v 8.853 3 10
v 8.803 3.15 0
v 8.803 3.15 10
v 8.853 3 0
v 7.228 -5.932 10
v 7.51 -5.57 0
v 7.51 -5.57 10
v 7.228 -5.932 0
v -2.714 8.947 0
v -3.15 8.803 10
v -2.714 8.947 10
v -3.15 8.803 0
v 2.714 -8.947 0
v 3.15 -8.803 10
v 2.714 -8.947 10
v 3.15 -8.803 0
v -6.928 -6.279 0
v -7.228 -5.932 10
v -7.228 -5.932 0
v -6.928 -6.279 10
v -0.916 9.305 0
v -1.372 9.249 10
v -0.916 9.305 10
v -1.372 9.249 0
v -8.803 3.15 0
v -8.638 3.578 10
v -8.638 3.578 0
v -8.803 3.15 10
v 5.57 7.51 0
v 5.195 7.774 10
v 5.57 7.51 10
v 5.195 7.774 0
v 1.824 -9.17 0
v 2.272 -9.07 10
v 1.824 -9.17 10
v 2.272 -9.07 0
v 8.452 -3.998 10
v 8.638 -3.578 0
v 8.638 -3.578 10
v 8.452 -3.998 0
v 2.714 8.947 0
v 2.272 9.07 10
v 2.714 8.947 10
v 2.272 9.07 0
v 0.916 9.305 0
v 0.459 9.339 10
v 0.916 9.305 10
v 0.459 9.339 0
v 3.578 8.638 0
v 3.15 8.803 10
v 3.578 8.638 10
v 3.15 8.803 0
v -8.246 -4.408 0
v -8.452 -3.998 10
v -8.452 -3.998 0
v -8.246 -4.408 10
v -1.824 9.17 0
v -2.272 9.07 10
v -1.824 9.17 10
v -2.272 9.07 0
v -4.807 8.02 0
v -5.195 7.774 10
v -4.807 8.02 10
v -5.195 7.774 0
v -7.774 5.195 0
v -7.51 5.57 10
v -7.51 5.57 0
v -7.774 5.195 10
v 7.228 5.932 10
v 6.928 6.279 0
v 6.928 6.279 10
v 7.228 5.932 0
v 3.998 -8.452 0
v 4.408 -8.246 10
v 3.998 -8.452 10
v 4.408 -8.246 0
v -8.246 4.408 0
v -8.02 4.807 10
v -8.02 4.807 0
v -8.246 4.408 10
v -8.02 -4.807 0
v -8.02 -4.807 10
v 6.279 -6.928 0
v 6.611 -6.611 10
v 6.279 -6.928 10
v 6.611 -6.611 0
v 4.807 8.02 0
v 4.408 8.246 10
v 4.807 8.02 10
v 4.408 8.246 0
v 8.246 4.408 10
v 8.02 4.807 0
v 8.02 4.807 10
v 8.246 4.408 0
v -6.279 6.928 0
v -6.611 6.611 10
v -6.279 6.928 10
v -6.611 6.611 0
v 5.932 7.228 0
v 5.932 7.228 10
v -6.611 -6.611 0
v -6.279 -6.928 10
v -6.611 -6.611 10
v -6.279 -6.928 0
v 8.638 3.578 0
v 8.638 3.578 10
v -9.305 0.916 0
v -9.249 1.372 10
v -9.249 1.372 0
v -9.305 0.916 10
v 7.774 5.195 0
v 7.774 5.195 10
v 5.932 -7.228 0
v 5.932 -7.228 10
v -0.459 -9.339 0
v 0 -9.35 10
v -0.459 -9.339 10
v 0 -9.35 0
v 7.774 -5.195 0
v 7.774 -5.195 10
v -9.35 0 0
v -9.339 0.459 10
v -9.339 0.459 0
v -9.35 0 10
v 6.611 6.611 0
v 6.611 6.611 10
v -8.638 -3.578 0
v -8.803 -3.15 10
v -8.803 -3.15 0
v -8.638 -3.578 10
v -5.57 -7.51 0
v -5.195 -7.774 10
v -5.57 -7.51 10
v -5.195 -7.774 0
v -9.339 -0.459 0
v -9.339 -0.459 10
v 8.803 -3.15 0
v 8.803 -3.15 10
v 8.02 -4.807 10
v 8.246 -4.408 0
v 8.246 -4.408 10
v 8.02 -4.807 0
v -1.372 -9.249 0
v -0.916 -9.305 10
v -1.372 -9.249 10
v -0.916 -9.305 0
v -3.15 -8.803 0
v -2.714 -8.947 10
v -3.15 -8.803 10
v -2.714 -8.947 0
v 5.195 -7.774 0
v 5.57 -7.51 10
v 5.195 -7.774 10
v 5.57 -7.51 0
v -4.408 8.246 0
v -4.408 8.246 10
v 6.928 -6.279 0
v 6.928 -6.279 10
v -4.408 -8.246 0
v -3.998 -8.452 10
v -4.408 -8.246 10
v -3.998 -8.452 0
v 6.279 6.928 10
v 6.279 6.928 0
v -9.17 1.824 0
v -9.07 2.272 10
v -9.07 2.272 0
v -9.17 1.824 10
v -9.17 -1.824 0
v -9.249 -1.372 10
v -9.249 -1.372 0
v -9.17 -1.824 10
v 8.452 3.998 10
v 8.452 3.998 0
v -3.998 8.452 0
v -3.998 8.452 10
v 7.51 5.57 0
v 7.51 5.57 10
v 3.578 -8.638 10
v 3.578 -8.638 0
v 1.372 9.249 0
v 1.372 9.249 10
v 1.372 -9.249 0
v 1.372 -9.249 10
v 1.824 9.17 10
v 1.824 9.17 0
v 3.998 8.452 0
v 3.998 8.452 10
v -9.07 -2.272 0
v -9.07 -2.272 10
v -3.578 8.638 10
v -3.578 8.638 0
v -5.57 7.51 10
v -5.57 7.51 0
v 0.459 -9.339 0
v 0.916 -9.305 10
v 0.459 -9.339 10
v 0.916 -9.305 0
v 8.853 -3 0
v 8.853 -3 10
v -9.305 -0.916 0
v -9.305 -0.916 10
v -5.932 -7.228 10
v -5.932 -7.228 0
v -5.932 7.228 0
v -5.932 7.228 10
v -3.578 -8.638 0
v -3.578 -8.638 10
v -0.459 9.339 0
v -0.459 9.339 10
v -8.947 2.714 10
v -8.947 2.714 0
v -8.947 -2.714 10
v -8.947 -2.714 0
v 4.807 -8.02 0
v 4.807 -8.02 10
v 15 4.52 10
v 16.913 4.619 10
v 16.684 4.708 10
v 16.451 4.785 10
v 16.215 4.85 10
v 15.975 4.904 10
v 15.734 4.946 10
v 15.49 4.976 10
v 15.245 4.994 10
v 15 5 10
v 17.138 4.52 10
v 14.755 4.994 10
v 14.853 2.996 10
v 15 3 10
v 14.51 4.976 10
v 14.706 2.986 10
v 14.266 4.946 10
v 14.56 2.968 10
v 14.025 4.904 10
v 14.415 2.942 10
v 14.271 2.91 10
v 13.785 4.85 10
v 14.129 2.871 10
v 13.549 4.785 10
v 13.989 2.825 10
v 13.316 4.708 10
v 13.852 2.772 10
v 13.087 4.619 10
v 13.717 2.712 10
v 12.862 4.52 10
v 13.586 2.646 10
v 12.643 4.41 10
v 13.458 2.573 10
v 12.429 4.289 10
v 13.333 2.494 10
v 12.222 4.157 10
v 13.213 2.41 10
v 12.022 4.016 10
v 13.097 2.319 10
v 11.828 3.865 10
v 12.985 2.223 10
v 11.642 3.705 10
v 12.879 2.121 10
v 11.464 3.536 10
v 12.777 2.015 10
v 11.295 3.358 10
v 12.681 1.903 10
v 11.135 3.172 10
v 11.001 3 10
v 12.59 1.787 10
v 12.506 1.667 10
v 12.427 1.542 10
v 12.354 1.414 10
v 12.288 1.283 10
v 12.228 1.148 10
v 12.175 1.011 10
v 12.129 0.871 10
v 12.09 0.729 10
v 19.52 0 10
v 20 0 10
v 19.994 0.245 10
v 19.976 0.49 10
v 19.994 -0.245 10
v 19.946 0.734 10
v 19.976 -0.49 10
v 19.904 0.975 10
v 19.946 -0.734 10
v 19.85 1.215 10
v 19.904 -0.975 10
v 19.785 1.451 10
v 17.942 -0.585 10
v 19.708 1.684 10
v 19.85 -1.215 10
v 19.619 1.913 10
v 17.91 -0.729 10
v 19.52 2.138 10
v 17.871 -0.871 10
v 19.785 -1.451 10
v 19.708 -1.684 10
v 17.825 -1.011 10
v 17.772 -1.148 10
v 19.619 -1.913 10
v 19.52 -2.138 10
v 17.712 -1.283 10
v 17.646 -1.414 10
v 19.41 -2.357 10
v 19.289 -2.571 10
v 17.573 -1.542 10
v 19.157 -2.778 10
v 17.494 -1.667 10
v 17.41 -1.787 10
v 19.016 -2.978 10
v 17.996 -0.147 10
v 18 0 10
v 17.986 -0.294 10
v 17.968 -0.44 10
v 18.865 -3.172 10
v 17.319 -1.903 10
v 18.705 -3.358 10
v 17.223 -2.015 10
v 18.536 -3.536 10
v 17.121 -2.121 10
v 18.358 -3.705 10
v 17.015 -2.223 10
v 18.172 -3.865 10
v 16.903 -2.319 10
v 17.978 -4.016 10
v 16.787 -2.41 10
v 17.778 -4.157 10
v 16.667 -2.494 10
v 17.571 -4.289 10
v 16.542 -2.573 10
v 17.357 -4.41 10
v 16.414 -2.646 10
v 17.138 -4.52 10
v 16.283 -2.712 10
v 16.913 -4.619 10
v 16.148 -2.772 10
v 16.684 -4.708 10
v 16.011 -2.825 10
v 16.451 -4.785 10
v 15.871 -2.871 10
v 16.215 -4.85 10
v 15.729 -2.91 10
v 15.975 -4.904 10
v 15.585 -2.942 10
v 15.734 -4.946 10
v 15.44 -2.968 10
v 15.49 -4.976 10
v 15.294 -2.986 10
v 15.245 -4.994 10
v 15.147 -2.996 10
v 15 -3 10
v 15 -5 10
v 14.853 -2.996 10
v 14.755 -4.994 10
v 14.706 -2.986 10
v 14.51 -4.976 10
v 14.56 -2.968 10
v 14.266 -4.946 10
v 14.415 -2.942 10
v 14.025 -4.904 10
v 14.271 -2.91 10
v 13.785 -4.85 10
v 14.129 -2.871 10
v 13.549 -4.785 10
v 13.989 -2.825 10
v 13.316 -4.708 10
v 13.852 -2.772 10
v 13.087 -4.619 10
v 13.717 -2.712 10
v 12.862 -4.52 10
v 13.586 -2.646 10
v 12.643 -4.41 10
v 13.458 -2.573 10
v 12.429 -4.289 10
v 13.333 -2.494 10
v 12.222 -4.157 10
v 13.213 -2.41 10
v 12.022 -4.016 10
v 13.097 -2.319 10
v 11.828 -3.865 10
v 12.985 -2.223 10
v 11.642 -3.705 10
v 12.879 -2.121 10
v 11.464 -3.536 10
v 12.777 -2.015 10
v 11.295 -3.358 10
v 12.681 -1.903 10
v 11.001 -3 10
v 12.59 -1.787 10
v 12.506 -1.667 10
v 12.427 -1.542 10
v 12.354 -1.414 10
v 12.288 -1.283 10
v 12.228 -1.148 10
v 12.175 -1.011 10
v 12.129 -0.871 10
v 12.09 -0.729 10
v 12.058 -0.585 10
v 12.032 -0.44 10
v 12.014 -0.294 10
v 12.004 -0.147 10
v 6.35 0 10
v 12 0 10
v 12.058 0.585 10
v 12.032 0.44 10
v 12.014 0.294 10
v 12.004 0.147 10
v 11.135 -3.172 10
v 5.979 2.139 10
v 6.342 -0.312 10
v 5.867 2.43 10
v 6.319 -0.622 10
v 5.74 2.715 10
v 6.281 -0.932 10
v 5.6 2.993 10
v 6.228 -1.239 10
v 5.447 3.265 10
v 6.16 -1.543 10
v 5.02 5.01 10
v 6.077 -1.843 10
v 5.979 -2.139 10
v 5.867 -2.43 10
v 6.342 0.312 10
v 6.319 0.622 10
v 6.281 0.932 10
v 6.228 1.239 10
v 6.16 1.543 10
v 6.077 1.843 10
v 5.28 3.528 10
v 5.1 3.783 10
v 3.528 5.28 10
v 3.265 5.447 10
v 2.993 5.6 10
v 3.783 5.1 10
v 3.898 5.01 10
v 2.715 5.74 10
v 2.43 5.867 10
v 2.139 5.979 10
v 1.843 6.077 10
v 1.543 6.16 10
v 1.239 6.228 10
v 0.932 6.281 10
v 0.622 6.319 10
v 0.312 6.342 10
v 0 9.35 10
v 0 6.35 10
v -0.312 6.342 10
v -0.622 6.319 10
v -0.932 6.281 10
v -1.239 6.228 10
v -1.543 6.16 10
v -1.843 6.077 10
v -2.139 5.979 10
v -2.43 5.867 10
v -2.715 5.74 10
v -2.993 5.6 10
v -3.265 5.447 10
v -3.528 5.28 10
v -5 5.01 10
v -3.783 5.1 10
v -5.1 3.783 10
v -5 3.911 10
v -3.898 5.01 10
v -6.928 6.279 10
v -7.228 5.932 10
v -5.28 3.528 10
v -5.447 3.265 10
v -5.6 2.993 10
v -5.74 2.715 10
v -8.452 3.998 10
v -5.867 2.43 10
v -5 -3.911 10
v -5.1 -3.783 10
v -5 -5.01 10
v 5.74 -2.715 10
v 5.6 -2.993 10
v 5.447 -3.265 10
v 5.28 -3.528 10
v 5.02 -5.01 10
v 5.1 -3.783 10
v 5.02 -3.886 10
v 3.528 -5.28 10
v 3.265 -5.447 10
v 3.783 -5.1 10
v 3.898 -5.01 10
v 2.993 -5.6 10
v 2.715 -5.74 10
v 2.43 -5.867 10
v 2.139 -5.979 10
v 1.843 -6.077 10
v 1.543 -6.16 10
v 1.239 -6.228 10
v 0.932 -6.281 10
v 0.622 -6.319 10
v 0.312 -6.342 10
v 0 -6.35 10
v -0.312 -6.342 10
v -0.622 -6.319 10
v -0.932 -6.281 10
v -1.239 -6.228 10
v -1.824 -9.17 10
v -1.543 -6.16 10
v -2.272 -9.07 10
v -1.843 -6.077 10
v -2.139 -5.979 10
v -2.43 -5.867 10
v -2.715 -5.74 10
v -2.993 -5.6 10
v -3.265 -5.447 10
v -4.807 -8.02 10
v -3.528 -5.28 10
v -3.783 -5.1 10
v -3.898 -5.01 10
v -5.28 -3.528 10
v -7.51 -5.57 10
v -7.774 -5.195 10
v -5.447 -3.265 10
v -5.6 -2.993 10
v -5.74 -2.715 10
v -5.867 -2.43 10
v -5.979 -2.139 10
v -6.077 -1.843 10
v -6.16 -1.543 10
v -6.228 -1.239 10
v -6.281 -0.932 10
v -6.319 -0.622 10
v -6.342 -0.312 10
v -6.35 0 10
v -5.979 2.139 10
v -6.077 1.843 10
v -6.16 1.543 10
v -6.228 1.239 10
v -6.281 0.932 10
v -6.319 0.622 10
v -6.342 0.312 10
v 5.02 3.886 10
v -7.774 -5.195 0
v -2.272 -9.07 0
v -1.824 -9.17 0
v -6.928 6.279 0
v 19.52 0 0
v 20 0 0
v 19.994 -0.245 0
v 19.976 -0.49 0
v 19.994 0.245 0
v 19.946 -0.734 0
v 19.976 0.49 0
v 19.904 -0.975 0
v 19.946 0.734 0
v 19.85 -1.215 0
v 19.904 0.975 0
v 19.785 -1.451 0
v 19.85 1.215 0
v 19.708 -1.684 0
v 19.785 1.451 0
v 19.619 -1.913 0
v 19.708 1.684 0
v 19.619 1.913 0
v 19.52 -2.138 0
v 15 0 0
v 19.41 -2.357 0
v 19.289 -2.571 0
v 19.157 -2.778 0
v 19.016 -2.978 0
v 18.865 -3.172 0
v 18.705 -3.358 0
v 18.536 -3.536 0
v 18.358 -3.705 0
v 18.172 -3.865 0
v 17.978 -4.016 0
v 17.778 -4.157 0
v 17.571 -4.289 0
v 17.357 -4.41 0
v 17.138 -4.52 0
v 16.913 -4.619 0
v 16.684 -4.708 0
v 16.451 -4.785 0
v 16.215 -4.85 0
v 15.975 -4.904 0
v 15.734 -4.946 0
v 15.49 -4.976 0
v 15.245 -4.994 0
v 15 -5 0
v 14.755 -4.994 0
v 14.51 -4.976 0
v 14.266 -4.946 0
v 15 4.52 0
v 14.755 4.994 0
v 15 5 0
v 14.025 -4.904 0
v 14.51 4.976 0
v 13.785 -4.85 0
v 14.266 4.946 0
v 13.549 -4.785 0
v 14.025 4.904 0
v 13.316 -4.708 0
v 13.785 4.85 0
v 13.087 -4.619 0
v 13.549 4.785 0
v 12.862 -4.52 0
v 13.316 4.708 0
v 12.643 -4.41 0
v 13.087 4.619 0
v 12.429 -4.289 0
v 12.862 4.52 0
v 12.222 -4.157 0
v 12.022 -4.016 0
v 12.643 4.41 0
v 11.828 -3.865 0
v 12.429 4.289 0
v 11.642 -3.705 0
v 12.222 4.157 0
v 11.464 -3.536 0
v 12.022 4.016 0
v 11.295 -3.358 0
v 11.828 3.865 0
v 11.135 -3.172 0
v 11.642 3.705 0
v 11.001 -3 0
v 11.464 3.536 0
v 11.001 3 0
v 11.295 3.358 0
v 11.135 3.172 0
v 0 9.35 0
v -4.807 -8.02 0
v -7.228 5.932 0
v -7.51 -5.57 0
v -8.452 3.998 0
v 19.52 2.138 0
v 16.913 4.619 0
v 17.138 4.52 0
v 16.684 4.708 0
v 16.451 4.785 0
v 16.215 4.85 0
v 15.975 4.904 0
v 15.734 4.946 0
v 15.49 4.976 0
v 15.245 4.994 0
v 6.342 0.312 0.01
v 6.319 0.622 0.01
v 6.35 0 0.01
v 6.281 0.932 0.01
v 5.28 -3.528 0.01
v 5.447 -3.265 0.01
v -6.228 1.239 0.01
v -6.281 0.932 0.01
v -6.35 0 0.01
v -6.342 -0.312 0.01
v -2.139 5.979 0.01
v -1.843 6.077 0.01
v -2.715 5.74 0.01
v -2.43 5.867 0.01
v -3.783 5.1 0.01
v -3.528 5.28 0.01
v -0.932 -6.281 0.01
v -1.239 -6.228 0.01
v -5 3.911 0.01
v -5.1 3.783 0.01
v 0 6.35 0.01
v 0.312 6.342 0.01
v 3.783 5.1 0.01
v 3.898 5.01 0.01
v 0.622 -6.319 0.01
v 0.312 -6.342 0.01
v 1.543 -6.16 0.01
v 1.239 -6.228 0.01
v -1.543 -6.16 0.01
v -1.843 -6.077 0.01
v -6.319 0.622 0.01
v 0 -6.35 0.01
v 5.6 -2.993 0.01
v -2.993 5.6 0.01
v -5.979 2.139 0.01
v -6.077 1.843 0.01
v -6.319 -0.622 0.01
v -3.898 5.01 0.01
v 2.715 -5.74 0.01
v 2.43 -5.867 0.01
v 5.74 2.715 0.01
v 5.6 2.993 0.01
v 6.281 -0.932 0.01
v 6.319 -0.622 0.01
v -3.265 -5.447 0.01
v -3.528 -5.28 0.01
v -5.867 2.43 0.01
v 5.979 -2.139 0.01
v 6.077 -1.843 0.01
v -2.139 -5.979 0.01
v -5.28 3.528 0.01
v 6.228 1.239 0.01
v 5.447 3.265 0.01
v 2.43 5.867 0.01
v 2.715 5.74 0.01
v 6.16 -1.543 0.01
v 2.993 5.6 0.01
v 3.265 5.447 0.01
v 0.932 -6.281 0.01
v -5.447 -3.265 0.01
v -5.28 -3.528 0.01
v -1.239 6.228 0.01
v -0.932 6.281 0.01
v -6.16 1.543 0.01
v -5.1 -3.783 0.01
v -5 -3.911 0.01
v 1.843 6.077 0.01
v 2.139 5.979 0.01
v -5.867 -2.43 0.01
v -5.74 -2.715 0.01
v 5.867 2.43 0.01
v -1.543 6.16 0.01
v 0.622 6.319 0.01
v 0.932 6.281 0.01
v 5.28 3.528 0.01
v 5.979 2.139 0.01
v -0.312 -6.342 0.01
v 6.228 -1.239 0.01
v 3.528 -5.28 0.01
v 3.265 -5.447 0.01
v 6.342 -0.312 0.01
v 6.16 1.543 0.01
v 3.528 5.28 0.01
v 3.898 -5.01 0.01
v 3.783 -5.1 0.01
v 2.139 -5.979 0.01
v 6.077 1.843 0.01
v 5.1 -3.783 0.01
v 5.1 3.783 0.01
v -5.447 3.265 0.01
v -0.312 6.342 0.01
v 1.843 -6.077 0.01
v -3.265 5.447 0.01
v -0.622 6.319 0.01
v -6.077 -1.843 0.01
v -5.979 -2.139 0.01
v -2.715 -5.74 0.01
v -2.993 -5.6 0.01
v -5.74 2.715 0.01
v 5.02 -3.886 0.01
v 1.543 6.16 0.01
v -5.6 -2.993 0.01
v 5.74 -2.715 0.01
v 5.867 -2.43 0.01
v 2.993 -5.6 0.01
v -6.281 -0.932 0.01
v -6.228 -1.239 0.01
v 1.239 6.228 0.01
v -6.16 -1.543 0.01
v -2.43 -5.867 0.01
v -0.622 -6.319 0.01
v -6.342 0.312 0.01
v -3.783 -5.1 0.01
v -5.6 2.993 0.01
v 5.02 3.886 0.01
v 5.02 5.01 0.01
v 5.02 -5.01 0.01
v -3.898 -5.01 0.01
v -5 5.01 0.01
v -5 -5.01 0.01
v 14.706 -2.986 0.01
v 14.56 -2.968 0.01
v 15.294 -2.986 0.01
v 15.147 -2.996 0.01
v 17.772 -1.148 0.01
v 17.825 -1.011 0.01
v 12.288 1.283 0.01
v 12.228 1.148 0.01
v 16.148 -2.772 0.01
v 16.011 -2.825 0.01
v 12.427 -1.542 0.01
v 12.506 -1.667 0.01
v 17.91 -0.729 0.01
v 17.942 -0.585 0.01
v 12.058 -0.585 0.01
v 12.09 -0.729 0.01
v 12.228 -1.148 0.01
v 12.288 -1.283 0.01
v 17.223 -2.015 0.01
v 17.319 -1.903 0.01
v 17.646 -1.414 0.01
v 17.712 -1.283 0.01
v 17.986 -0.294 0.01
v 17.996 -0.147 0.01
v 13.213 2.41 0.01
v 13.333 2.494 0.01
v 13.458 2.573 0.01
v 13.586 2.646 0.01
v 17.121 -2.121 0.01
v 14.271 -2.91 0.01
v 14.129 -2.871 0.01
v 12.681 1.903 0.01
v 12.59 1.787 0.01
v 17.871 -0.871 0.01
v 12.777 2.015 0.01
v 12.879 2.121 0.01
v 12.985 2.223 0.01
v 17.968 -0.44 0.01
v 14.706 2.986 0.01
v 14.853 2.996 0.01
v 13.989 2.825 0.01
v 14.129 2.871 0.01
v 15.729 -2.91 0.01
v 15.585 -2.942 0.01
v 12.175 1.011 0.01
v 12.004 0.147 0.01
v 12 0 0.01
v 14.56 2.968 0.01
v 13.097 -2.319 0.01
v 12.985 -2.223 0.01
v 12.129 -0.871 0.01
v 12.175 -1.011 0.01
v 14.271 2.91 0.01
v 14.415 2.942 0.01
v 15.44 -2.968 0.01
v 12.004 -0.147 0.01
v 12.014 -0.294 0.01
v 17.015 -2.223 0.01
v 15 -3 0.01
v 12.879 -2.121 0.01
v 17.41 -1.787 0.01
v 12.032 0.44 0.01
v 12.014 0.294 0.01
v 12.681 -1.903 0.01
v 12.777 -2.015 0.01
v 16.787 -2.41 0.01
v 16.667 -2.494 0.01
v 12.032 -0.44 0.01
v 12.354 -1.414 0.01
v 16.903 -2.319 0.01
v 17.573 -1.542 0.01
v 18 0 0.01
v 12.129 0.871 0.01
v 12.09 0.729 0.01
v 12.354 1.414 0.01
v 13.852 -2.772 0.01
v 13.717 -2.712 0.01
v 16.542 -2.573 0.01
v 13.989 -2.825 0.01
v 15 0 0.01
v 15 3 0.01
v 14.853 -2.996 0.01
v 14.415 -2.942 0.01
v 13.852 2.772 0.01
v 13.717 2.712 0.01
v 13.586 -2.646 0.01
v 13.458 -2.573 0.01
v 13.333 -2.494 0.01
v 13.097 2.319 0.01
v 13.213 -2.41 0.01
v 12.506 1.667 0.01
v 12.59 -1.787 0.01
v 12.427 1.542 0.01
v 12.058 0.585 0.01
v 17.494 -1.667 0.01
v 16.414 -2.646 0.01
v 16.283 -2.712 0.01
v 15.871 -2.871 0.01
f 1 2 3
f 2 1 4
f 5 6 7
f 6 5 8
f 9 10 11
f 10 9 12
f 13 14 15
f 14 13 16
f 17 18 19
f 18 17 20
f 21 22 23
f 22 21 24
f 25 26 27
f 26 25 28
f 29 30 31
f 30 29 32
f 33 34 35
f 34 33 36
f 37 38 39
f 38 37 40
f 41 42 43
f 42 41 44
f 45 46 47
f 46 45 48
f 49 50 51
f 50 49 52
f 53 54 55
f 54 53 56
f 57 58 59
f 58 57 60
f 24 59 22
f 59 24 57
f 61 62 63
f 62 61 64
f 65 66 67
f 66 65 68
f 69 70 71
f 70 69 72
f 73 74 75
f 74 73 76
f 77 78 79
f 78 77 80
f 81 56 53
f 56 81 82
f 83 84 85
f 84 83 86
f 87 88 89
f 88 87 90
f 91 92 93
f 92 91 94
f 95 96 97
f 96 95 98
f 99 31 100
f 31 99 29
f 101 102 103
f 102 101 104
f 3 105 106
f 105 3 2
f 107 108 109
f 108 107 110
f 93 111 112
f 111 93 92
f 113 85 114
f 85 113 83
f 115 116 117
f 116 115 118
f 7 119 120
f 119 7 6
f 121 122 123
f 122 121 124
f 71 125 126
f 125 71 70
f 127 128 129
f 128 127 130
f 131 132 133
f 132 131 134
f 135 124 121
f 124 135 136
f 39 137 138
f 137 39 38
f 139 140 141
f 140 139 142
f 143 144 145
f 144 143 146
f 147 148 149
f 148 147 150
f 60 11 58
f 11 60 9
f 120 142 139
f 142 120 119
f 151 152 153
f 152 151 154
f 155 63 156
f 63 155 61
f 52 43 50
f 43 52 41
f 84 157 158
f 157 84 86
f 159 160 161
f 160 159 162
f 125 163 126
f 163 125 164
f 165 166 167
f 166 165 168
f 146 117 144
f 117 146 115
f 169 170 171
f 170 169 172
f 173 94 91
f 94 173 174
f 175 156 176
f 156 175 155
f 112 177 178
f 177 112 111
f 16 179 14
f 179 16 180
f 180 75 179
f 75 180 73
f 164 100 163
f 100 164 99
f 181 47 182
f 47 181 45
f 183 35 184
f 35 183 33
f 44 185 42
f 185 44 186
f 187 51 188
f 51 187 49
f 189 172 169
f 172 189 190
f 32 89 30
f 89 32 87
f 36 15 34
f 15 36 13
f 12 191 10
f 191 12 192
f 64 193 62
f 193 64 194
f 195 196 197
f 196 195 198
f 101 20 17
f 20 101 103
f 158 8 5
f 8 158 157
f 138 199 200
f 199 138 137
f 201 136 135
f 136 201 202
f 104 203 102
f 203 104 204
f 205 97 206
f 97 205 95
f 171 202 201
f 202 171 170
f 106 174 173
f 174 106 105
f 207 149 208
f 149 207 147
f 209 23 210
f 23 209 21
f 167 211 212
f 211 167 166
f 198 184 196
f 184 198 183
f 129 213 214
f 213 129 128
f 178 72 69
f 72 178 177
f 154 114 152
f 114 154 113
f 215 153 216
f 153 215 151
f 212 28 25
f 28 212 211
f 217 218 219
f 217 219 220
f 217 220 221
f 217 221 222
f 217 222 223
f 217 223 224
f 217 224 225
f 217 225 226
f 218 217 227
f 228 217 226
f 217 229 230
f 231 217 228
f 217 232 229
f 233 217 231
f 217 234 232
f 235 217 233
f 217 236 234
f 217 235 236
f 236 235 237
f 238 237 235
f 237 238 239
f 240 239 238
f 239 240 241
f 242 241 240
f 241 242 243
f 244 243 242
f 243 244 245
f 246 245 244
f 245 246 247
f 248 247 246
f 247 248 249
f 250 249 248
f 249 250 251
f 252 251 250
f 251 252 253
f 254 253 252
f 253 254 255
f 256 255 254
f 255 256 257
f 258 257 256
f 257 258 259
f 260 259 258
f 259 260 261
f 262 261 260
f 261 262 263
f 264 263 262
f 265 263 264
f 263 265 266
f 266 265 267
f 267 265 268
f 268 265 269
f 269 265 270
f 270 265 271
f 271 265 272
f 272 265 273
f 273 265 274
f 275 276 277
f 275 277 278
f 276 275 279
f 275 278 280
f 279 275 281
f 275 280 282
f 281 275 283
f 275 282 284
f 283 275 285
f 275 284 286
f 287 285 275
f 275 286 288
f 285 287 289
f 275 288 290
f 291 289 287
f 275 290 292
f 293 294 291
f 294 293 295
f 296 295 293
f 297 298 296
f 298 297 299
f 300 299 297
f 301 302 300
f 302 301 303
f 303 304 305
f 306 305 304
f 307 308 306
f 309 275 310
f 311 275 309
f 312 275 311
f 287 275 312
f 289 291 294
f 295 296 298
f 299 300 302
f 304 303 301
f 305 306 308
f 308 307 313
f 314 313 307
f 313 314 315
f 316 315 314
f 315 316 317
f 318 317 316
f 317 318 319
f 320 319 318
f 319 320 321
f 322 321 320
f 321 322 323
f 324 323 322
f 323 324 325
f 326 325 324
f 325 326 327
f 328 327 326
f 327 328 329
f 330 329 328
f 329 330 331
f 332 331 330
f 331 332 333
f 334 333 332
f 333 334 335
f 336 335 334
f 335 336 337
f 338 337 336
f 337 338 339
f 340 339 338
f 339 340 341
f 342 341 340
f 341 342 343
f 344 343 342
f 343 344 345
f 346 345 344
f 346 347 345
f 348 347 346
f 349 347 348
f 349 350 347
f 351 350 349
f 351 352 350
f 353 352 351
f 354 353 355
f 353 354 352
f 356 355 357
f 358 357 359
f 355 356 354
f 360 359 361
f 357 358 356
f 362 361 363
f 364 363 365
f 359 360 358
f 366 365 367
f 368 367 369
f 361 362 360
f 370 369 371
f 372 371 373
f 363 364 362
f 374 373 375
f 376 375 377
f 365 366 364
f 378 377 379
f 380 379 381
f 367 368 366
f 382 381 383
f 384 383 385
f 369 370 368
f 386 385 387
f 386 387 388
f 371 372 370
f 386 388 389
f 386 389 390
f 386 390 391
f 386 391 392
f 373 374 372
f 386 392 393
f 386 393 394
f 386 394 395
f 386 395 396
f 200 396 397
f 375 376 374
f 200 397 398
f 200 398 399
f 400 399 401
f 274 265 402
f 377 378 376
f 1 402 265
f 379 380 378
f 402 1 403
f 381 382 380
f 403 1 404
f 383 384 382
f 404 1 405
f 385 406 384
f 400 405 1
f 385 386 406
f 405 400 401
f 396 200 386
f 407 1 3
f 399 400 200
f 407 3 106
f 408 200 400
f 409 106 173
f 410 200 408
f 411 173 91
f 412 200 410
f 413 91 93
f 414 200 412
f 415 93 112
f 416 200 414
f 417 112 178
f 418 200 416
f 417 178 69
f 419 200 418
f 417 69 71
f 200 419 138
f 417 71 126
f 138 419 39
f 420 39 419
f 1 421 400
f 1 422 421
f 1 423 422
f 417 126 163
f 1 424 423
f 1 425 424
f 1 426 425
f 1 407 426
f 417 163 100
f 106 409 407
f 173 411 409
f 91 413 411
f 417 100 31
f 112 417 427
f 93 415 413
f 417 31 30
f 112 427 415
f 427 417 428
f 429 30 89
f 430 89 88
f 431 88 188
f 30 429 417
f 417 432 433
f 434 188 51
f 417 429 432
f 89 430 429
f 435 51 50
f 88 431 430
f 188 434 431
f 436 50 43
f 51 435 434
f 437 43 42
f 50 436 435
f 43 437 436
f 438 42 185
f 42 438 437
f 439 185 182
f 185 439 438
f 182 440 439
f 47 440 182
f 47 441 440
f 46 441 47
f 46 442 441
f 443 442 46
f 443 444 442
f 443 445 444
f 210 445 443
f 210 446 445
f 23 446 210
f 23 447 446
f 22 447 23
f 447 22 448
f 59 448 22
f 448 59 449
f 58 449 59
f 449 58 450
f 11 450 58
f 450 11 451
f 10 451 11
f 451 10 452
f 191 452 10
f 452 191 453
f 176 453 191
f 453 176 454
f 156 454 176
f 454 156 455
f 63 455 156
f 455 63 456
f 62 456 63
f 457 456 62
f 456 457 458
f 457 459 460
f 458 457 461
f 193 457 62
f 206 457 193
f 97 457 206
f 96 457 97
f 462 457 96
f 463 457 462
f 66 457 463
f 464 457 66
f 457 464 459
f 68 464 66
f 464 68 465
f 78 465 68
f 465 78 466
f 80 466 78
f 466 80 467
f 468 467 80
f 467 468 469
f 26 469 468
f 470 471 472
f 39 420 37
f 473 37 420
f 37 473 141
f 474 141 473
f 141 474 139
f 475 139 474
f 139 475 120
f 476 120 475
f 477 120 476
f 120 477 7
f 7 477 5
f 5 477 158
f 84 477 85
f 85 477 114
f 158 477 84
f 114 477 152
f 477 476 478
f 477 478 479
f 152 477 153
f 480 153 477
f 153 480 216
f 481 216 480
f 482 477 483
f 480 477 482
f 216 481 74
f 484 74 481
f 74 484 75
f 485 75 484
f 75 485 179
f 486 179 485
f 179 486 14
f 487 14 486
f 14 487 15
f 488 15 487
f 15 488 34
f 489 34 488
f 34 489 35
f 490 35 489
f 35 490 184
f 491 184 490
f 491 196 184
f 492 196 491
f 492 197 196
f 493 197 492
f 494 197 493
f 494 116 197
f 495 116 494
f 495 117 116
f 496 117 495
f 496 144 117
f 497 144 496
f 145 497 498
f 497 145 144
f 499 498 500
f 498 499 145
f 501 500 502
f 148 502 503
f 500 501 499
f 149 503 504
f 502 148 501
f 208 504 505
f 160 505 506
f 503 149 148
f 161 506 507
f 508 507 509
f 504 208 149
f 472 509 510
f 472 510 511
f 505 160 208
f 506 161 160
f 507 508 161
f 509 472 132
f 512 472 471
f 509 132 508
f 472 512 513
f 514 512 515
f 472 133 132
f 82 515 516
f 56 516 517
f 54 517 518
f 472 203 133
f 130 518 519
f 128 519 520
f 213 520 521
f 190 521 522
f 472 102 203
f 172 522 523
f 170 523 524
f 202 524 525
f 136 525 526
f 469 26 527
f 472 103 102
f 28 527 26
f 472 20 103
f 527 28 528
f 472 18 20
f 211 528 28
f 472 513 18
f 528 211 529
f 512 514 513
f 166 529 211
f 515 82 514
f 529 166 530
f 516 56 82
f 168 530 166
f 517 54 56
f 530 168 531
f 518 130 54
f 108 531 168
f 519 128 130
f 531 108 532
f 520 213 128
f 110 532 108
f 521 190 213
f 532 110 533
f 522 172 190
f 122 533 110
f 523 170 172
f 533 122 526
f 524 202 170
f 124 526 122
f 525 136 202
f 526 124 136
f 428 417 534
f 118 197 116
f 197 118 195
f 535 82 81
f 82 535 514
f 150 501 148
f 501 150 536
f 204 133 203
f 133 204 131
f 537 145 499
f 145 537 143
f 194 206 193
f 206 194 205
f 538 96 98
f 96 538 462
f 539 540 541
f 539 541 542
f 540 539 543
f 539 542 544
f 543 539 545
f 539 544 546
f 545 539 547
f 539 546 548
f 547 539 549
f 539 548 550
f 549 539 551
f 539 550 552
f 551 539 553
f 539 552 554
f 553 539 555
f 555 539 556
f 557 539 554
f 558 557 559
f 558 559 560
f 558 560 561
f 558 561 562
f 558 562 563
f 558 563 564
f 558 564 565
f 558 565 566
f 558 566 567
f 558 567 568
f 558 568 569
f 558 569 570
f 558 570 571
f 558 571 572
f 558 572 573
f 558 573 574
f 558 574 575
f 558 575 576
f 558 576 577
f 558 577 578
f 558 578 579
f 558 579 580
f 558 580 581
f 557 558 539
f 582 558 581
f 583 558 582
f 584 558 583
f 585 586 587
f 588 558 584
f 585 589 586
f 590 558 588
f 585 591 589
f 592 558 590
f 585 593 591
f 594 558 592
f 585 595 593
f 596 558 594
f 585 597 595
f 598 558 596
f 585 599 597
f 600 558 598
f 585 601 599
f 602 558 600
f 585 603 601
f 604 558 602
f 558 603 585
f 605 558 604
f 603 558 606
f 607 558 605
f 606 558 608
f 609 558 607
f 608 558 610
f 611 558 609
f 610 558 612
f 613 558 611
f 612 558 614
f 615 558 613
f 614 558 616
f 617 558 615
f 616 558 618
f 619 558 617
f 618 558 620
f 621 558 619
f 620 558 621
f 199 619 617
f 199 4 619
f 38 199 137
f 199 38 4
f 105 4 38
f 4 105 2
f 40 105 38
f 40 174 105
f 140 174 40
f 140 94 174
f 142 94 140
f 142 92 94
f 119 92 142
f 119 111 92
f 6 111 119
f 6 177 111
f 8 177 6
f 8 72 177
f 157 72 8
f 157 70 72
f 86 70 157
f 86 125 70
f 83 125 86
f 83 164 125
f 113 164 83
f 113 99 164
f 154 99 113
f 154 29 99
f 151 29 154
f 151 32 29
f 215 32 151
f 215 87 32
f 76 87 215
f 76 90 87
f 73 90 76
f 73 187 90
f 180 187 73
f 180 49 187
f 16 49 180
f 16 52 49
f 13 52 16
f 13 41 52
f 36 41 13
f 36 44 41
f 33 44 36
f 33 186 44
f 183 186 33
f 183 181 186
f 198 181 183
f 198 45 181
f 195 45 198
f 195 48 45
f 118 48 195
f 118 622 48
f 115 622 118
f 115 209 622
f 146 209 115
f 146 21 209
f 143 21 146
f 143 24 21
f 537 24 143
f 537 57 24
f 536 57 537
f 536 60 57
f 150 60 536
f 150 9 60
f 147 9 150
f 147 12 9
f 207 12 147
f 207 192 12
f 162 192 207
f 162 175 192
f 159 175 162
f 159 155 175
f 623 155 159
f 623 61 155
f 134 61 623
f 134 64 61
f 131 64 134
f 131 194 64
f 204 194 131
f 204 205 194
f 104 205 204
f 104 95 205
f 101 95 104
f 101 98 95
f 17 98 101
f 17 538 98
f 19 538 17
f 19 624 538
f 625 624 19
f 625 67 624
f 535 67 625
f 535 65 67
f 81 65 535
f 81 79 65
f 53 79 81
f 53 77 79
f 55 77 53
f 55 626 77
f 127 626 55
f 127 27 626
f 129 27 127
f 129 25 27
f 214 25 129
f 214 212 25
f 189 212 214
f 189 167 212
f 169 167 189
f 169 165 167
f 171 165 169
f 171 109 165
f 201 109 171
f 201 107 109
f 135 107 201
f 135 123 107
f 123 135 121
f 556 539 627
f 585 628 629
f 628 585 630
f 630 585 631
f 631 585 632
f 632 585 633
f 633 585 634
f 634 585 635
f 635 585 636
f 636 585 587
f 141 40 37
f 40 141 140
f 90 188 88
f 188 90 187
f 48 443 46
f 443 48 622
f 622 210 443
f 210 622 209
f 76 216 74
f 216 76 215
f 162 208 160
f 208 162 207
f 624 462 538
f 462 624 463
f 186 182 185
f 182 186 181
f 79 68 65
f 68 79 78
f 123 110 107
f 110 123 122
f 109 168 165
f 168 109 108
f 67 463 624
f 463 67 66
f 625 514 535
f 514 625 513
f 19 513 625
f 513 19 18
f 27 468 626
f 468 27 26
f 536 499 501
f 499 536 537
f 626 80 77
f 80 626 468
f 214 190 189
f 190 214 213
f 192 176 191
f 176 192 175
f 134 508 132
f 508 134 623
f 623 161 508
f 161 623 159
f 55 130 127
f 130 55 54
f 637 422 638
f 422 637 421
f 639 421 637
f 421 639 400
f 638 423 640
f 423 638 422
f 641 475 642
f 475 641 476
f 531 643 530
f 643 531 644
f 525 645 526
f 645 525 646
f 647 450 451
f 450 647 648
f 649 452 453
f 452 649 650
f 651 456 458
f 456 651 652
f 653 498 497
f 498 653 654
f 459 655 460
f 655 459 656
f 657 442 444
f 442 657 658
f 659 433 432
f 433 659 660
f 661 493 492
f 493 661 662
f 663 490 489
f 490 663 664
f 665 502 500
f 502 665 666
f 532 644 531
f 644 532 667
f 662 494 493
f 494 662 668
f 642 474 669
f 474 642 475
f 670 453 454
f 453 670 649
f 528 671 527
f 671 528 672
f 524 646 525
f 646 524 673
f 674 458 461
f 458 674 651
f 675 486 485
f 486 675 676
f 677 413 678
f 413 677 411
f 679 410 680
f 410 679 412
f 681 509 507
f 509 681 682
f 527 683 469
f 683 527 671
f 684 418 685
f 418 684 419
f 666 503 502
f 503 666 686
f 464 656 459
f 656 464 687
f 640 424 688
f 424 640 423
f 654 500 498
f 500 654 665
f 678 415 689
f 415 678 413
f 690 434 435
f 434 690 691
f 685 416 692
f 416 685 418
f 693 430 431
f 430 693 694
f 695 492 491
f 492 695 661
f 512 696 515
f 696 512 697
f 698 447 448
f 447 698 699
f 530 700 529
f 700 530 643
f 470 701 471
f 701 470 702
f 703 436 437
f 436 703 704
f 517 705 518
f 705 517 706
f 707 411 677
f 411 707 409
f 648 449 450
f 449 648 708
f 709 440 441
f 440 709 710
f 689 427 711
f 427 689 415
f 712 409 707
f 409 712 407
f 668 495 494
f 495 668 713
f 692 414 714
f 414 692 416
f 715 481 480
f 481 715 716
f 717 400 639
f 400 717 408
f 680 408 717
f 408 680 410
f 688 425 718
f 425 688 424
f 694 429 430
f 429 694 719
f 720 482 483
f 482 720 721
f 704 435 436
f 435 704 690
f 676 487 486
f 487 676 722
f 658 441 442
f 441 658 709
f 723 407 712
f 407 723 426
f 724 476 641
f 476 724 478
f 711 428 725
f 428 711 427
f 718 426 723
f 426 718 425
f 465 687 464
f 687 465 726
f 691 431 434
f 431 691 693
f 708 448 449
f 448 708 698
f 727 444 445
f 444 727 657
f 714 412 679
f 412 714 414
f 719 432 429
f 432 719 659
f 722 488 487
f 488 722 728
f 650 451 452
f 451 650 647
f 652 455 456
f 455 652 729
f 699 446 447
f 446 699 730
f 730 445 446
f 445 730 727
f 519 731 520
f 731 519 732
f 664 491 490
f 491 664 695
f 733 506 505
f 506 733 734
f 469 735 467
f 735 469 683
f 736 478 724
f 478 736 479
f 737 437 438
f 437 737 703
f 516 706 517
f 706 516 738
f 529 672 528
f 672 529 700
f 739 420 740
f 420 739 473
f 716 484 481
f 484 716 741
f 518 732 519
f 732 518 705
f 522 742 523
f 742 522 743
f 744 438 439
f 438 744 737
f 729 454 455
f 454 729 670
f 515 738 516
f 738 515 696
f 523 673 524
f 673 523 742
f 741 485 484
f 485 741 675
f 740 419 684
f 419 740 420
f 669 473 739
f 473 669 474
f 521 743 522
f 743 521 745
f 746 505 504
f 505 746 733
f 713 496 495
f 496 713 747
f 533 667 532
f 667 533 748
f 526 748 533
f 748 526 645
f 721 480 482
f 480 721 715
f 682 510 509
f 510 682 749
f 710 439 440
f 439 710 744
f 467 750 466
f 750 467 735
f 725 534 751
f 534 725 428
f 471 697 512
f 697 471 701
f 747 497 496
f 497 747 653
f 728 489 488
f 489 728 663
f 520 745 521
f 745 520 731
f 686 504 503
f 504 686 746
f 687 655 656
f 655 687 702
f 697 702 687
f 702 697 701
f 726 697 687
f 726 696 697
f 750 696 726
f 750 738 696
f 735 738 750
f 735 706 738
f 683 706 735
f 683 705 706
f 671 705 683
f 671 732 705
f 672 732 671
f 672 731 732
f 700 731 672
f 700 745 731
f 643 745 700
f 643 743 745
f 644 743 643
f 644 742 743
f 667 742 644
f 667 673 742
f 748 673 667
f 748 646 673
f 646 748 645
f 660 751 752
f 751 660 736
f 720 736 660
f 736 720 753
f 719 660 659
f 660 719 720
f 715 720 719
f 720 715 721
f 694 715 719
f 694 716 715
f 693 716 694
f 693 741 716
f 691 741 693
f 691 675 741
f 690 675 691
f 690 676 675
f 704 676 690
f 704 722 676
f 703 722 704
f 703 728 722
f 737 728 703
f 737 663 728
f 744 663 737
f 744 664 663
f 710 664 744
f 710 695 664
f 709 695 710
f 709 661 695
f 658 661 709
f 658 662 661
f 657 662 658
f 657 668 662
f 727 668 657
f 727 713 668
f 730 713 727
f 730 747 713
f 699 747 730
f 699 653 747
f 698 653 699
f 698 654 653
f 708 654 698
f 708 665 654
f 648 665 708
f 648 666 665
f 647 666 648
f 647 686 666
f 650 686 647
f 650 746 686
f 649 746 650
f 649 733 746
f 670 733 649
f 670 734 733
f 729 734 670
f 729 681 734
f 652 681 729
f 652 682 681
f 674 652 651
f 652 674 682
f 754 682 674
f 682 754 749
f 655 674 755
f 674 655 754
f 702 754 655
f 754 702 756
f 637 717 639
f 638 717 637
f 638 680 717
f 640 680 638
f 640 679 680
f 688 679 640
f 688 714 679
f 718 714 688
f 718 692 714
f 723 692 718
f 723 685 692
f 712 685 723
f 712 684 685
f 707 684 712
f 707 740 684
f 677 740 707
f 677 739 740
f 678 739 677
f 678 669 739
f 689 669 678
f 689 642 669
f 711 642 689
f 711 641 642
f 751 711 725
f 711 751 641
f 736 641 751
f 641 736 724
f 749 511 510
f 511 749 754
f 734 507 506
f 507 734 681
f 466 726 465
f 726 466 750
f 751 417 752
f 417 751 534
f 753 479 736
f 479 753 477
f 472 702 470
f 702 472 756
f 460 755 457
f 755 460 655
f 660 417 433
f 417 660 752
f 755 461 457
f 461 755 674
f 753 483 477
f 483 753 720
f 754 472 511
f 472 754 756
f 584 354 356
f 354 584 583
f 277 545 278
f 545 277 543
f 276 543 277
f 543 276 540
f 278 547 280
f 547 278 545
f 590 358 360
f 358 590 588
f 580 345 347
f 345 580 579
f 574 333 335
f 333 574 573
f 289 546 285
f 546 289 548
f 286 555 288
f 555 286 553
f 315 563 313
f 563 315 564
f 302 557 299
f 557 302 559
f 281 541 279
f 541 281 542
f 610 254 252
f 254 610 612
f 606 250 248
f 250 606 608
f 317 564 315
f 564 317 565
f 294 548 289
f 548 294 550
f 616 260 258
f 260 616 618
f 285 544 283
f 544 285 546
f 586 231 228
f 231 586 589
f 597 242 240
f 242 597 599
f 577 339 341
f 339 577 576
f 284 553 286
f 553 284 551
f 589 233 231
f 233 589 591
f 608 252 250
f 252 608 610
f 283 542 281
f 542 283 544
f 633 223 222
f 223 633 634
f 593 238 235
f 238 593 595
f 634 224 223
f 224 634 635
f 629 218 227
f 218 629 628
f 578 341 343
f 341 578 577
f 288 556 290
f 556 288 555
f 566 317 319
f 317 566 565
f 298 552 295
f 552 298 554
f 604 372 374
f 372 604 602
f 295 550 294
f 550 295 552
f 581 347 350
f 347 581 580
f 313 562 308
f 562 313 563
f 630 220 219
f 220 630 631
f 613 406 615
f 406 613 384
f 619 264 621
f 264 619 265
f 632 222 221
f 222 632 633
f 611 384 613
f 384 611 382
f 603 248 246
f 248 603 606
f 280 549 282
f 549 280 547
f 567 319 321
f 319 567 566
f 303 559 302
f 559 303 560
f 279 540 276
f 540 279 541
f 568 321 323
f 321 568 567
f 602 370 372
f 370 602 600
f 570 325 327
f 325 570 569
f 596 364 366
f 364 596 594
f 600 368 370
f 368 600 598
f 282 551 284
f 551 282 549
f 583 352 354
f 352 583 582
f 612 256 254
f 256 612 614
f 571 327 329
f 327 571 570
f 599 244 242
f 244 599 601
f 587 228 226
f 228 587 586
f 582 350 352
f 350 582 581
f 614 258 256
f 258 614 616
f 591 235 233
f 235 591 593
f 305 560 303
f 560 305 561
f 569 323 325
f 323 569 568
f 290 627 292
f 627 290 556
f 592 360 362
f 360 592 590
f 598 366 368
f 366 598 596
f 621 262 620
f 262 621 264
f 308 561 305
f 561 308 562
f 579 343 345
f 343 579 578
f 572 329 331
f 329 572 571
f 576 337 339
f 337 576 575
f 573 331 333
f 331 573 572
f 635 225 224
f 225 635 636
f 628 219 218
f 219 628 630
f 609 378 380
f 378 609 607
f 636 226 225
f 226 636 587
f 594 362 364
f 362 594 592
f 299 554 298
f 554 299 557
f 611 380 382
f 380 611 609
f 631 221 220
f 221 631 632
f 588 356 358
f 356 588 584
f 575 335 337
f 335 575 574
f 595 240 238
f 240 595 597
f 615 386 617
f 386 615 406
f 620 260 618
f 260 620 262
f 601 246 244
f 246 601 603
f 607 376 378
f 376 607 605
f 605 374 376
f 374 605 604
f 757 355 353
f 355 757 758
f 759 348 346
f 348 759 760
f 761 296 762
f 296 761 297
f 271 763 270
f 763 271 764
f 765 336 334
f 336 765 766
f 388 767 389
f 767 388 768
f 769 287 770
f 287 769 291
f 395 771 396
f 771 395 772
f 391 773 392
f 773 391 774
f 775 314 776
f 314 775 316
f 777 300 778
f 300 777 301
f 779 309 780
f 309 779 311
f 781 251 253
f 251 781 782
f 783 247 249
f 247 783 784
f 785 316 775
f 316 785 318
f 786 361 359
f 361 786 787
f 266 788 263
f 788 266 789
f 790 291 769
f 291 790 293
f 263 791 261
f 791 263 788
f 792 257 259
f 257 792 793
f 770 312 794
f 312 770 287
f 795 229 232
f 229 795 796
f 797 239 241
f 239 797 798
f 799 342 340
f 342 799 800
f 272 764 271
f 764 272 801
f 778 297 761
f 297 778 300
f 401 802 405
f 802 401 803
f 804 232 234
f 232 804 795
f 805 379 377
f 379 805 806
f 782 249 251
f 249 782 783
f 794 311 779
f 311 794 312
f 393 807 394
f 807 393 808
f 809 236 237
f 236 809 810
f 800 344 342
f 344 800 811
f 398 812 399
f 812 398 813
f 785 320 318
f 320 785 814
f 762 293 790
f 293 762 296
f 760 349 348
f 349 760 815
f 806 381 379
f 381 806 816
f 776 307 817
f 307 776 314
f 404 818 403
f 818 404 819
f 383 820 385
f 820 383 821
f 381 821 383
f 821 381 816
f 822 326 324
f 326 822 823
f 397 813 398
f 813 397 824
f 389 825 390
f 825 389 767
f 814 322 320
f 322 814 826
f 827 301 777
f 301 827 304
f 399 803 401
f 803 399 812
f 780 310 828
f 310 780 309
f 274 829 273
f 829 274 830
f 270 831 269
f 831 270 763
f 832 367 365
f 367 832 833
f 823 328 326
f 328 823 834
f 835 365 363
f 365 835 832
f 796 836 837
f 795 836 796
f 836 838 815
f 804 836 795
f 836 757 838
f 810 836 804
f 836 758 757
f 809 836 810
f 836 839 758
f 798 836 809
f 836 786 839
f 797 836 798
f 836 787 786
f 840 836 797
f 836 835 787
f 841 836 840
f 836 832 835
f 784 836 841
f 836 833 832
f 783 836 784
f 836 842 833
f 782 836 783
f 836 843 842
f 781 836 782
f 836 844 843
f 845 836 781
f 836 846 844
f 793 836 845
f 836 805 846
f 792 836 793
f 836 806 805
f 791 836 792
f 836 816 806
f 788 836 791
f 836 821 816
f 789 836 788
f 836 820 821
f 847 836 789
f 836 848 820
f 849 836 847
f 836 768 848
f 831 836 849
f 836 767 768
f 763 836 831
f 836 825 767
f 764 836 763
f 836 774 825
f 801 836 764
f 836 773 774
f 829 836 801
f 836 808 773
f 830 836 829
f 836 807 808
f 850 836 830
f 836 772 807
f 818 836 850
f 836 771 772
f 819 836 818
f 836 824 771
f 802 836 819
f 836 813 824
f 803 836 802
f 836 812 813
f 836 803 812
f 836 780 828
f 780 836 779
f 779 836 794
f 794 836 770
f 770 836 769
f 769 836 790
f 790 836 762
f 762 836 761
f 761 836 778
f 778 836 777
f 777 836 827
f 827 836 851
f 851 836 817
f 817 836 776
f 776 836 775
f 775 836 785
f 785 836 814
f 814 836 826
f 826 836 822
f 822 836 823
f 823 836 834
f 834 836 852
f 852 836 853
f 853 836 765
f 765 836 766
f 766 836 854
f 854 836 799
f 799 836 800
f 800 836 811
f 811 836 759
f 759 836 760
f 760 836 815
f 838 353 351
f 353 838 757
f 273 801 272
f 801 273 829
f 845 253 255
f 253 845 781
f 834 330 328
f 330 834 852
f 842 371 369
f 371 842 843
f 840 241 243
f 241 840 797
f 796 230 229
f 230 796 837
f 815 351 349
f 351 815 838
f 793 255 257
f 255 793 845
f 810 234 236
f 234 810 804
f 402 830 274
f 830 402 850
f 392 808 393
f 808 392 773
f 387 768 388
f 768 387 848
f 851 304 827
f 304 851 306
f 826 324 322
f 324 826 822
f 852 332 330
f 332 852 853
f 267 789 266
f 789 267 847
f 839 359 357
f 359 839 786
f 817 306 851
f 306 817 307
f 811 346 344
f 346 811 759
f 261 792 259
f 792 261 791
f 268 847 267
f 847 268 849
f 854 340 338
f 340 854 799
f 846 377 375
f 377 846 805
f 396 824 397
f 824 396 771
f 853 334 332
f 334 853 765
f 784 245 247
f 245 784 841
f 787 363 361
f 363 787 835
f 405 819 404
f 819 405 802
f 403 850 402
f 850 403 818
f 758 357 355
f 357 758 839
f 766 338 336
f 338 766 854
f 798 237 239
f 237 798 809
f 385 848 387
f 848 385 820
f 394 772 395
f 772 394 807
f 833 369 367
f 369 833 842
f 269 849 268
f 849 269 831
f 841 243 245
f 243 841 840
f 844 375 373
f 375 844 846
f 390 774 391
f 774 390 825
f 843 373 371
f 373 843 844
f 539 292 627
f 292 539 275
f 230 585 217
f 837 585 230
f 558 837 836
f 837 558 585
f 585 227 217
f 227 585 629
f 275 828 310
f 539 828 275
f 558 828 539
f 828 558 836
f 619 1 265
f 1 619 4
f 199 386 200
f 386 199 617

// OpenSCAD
// Snap-on Clip for Lab Stand Rod and Tubing
// Orientation: Flat on XY plane, building up in +Z.
// Units: Millimetres.

// --- Dimensions ---
// Rod Stand Dimensions
$rod_diameter = 12.7;
$rod_wall_thickness = 3;
$rod_outer_diameter = $rod_diameter + 2 * $rod_wall_thickness; // 18.7
$rod_ring_height = 10;

// Tubing Dimensions
$tubing_diameter = 6;
$tubing_wall_thickness = 2;
$tubing_outer_diameter = $tubing_diameter + 2 * $tubing_wall_thickness; // 8
$tubing_ring_height = 10;

// Positioning
$rod_center_x = 0;
$rod_center_y = 0;
$tubing_center_x = 15;
$tubing_center_y = 0;

// Bridge Dimensions
$bridge_width_x = 4; // From x=8 to x=12
$bridge_width_y = 6;
$bridge_height = 10;

// Cutout Dimensions
$rod_cutout_width = 10;
$rod_cutout_height = 10; // -5 to 5

$tubing_cutout_width = 4.5;
$tubing_cutout_height = 4.5; // -2.25 to 2.25

// --- Configuration ---
$fn = 128; // High resolution for smooth curves

module rod_ring() {
    // Main Ring
    difference() {
        // Extrude the full outer circle
        translate([0, 0, 0])
            cylinder(h = $rod_ring_height, d = $rod_outer_diameter, $fn = $fn);
        
        // Inner Hole
        translate([0, 0, 0.01])
            cylinder(h = $rod_ring_height + 0.02, d = $rod_diameter, $fn = $fn);
        
        // Cutout on -X side
        // Spec: "everything with x < 0 and -5 < y < 5 is removed"
        // This implies the cutout starts at x=0 and goes left to x=-10.
        // Box X range: [-10, 0]. Center = -5.
        // Box Y range: [-5, 5]. Center = 0.
        
        translate([
            -$rod_cutout_width / 2, // -5
            -$rod_cutout_height / 2 - 0.01, // -5.01
            0.01
        ])
            cube([
                $rod_cutout_width + 0.02, // 10.02
                $rod_cutout_height + 0.02, // 10.02
                $rod_ring_height + 0.02
            ]);
    }
}

module tubing_ring() {
    // Main Ring
    difference() {
        // Extrude the full outer circle
        translate([0, 0, 0])
            cylinder(h = $tubing_ring_height, d = $tubing_outer_diameter, $fn = $fn);
        
        // Inner Hole
        translate([0, 0, 0.01])
            cylinder(h = $tubing_ring_height + 0.02, d = $tubing_diameter, $fn = $fn);
        
        // Cutout on +X side
        // Spec: "x > 15 and -2.25 < y < 2.25"
        // This implies the cutout starts at x=15 and goes right to x=19.5.
        // Box X range: [15, 19.5]. Center = 17.25.
        // Box Y range: [-2.25, 2.25]. Center = 0.
        
        translate([
            $tubing_cutout_width / 2 - 0.01, // 2.25 - 0.01 = 2.24 (Wait, logic check)
            // We need the box to start at 15.
            // Box width is 4.5.
            // Start X = 15.
            // Translate X = 15 - (4.5 / 2) = 12.75.
            // Let's re-verify: 12.75 + 2.25 = 15. Correct.
            15 - ($tubing_cutout_width / 2) - 0.01, 
            -$tubing_cutout_height / 2 - 0.01, 
            0.01
        ])
            cube([
                $tubing_cutout_width + 0.02, // 4.52
                $tubing_cutout_height + 0.02, // 4.52
                $tubing_ring_height + 0.02
            ]);
    }
}

module bridge() {
    // Solid bridge between x=8 and x=12
    // Width in Y is 6mm.
    // Height is 10mm.
    translate([8, -3, 0])
        cube([4, 6, 10]);
}

// --- Main Assembly ---
difference() {
    union() {
        // 1. Rod Ring
        translate([$rod_center_x, $rod_center_y, 0])
            rod_ring();
        
        // 2. Tubing Ring
        translate([$tubing_center_x, $tubing_center_y, 0])
            tubing_ring();
        
        // 3. Bridge
        bridge();
    }
}
